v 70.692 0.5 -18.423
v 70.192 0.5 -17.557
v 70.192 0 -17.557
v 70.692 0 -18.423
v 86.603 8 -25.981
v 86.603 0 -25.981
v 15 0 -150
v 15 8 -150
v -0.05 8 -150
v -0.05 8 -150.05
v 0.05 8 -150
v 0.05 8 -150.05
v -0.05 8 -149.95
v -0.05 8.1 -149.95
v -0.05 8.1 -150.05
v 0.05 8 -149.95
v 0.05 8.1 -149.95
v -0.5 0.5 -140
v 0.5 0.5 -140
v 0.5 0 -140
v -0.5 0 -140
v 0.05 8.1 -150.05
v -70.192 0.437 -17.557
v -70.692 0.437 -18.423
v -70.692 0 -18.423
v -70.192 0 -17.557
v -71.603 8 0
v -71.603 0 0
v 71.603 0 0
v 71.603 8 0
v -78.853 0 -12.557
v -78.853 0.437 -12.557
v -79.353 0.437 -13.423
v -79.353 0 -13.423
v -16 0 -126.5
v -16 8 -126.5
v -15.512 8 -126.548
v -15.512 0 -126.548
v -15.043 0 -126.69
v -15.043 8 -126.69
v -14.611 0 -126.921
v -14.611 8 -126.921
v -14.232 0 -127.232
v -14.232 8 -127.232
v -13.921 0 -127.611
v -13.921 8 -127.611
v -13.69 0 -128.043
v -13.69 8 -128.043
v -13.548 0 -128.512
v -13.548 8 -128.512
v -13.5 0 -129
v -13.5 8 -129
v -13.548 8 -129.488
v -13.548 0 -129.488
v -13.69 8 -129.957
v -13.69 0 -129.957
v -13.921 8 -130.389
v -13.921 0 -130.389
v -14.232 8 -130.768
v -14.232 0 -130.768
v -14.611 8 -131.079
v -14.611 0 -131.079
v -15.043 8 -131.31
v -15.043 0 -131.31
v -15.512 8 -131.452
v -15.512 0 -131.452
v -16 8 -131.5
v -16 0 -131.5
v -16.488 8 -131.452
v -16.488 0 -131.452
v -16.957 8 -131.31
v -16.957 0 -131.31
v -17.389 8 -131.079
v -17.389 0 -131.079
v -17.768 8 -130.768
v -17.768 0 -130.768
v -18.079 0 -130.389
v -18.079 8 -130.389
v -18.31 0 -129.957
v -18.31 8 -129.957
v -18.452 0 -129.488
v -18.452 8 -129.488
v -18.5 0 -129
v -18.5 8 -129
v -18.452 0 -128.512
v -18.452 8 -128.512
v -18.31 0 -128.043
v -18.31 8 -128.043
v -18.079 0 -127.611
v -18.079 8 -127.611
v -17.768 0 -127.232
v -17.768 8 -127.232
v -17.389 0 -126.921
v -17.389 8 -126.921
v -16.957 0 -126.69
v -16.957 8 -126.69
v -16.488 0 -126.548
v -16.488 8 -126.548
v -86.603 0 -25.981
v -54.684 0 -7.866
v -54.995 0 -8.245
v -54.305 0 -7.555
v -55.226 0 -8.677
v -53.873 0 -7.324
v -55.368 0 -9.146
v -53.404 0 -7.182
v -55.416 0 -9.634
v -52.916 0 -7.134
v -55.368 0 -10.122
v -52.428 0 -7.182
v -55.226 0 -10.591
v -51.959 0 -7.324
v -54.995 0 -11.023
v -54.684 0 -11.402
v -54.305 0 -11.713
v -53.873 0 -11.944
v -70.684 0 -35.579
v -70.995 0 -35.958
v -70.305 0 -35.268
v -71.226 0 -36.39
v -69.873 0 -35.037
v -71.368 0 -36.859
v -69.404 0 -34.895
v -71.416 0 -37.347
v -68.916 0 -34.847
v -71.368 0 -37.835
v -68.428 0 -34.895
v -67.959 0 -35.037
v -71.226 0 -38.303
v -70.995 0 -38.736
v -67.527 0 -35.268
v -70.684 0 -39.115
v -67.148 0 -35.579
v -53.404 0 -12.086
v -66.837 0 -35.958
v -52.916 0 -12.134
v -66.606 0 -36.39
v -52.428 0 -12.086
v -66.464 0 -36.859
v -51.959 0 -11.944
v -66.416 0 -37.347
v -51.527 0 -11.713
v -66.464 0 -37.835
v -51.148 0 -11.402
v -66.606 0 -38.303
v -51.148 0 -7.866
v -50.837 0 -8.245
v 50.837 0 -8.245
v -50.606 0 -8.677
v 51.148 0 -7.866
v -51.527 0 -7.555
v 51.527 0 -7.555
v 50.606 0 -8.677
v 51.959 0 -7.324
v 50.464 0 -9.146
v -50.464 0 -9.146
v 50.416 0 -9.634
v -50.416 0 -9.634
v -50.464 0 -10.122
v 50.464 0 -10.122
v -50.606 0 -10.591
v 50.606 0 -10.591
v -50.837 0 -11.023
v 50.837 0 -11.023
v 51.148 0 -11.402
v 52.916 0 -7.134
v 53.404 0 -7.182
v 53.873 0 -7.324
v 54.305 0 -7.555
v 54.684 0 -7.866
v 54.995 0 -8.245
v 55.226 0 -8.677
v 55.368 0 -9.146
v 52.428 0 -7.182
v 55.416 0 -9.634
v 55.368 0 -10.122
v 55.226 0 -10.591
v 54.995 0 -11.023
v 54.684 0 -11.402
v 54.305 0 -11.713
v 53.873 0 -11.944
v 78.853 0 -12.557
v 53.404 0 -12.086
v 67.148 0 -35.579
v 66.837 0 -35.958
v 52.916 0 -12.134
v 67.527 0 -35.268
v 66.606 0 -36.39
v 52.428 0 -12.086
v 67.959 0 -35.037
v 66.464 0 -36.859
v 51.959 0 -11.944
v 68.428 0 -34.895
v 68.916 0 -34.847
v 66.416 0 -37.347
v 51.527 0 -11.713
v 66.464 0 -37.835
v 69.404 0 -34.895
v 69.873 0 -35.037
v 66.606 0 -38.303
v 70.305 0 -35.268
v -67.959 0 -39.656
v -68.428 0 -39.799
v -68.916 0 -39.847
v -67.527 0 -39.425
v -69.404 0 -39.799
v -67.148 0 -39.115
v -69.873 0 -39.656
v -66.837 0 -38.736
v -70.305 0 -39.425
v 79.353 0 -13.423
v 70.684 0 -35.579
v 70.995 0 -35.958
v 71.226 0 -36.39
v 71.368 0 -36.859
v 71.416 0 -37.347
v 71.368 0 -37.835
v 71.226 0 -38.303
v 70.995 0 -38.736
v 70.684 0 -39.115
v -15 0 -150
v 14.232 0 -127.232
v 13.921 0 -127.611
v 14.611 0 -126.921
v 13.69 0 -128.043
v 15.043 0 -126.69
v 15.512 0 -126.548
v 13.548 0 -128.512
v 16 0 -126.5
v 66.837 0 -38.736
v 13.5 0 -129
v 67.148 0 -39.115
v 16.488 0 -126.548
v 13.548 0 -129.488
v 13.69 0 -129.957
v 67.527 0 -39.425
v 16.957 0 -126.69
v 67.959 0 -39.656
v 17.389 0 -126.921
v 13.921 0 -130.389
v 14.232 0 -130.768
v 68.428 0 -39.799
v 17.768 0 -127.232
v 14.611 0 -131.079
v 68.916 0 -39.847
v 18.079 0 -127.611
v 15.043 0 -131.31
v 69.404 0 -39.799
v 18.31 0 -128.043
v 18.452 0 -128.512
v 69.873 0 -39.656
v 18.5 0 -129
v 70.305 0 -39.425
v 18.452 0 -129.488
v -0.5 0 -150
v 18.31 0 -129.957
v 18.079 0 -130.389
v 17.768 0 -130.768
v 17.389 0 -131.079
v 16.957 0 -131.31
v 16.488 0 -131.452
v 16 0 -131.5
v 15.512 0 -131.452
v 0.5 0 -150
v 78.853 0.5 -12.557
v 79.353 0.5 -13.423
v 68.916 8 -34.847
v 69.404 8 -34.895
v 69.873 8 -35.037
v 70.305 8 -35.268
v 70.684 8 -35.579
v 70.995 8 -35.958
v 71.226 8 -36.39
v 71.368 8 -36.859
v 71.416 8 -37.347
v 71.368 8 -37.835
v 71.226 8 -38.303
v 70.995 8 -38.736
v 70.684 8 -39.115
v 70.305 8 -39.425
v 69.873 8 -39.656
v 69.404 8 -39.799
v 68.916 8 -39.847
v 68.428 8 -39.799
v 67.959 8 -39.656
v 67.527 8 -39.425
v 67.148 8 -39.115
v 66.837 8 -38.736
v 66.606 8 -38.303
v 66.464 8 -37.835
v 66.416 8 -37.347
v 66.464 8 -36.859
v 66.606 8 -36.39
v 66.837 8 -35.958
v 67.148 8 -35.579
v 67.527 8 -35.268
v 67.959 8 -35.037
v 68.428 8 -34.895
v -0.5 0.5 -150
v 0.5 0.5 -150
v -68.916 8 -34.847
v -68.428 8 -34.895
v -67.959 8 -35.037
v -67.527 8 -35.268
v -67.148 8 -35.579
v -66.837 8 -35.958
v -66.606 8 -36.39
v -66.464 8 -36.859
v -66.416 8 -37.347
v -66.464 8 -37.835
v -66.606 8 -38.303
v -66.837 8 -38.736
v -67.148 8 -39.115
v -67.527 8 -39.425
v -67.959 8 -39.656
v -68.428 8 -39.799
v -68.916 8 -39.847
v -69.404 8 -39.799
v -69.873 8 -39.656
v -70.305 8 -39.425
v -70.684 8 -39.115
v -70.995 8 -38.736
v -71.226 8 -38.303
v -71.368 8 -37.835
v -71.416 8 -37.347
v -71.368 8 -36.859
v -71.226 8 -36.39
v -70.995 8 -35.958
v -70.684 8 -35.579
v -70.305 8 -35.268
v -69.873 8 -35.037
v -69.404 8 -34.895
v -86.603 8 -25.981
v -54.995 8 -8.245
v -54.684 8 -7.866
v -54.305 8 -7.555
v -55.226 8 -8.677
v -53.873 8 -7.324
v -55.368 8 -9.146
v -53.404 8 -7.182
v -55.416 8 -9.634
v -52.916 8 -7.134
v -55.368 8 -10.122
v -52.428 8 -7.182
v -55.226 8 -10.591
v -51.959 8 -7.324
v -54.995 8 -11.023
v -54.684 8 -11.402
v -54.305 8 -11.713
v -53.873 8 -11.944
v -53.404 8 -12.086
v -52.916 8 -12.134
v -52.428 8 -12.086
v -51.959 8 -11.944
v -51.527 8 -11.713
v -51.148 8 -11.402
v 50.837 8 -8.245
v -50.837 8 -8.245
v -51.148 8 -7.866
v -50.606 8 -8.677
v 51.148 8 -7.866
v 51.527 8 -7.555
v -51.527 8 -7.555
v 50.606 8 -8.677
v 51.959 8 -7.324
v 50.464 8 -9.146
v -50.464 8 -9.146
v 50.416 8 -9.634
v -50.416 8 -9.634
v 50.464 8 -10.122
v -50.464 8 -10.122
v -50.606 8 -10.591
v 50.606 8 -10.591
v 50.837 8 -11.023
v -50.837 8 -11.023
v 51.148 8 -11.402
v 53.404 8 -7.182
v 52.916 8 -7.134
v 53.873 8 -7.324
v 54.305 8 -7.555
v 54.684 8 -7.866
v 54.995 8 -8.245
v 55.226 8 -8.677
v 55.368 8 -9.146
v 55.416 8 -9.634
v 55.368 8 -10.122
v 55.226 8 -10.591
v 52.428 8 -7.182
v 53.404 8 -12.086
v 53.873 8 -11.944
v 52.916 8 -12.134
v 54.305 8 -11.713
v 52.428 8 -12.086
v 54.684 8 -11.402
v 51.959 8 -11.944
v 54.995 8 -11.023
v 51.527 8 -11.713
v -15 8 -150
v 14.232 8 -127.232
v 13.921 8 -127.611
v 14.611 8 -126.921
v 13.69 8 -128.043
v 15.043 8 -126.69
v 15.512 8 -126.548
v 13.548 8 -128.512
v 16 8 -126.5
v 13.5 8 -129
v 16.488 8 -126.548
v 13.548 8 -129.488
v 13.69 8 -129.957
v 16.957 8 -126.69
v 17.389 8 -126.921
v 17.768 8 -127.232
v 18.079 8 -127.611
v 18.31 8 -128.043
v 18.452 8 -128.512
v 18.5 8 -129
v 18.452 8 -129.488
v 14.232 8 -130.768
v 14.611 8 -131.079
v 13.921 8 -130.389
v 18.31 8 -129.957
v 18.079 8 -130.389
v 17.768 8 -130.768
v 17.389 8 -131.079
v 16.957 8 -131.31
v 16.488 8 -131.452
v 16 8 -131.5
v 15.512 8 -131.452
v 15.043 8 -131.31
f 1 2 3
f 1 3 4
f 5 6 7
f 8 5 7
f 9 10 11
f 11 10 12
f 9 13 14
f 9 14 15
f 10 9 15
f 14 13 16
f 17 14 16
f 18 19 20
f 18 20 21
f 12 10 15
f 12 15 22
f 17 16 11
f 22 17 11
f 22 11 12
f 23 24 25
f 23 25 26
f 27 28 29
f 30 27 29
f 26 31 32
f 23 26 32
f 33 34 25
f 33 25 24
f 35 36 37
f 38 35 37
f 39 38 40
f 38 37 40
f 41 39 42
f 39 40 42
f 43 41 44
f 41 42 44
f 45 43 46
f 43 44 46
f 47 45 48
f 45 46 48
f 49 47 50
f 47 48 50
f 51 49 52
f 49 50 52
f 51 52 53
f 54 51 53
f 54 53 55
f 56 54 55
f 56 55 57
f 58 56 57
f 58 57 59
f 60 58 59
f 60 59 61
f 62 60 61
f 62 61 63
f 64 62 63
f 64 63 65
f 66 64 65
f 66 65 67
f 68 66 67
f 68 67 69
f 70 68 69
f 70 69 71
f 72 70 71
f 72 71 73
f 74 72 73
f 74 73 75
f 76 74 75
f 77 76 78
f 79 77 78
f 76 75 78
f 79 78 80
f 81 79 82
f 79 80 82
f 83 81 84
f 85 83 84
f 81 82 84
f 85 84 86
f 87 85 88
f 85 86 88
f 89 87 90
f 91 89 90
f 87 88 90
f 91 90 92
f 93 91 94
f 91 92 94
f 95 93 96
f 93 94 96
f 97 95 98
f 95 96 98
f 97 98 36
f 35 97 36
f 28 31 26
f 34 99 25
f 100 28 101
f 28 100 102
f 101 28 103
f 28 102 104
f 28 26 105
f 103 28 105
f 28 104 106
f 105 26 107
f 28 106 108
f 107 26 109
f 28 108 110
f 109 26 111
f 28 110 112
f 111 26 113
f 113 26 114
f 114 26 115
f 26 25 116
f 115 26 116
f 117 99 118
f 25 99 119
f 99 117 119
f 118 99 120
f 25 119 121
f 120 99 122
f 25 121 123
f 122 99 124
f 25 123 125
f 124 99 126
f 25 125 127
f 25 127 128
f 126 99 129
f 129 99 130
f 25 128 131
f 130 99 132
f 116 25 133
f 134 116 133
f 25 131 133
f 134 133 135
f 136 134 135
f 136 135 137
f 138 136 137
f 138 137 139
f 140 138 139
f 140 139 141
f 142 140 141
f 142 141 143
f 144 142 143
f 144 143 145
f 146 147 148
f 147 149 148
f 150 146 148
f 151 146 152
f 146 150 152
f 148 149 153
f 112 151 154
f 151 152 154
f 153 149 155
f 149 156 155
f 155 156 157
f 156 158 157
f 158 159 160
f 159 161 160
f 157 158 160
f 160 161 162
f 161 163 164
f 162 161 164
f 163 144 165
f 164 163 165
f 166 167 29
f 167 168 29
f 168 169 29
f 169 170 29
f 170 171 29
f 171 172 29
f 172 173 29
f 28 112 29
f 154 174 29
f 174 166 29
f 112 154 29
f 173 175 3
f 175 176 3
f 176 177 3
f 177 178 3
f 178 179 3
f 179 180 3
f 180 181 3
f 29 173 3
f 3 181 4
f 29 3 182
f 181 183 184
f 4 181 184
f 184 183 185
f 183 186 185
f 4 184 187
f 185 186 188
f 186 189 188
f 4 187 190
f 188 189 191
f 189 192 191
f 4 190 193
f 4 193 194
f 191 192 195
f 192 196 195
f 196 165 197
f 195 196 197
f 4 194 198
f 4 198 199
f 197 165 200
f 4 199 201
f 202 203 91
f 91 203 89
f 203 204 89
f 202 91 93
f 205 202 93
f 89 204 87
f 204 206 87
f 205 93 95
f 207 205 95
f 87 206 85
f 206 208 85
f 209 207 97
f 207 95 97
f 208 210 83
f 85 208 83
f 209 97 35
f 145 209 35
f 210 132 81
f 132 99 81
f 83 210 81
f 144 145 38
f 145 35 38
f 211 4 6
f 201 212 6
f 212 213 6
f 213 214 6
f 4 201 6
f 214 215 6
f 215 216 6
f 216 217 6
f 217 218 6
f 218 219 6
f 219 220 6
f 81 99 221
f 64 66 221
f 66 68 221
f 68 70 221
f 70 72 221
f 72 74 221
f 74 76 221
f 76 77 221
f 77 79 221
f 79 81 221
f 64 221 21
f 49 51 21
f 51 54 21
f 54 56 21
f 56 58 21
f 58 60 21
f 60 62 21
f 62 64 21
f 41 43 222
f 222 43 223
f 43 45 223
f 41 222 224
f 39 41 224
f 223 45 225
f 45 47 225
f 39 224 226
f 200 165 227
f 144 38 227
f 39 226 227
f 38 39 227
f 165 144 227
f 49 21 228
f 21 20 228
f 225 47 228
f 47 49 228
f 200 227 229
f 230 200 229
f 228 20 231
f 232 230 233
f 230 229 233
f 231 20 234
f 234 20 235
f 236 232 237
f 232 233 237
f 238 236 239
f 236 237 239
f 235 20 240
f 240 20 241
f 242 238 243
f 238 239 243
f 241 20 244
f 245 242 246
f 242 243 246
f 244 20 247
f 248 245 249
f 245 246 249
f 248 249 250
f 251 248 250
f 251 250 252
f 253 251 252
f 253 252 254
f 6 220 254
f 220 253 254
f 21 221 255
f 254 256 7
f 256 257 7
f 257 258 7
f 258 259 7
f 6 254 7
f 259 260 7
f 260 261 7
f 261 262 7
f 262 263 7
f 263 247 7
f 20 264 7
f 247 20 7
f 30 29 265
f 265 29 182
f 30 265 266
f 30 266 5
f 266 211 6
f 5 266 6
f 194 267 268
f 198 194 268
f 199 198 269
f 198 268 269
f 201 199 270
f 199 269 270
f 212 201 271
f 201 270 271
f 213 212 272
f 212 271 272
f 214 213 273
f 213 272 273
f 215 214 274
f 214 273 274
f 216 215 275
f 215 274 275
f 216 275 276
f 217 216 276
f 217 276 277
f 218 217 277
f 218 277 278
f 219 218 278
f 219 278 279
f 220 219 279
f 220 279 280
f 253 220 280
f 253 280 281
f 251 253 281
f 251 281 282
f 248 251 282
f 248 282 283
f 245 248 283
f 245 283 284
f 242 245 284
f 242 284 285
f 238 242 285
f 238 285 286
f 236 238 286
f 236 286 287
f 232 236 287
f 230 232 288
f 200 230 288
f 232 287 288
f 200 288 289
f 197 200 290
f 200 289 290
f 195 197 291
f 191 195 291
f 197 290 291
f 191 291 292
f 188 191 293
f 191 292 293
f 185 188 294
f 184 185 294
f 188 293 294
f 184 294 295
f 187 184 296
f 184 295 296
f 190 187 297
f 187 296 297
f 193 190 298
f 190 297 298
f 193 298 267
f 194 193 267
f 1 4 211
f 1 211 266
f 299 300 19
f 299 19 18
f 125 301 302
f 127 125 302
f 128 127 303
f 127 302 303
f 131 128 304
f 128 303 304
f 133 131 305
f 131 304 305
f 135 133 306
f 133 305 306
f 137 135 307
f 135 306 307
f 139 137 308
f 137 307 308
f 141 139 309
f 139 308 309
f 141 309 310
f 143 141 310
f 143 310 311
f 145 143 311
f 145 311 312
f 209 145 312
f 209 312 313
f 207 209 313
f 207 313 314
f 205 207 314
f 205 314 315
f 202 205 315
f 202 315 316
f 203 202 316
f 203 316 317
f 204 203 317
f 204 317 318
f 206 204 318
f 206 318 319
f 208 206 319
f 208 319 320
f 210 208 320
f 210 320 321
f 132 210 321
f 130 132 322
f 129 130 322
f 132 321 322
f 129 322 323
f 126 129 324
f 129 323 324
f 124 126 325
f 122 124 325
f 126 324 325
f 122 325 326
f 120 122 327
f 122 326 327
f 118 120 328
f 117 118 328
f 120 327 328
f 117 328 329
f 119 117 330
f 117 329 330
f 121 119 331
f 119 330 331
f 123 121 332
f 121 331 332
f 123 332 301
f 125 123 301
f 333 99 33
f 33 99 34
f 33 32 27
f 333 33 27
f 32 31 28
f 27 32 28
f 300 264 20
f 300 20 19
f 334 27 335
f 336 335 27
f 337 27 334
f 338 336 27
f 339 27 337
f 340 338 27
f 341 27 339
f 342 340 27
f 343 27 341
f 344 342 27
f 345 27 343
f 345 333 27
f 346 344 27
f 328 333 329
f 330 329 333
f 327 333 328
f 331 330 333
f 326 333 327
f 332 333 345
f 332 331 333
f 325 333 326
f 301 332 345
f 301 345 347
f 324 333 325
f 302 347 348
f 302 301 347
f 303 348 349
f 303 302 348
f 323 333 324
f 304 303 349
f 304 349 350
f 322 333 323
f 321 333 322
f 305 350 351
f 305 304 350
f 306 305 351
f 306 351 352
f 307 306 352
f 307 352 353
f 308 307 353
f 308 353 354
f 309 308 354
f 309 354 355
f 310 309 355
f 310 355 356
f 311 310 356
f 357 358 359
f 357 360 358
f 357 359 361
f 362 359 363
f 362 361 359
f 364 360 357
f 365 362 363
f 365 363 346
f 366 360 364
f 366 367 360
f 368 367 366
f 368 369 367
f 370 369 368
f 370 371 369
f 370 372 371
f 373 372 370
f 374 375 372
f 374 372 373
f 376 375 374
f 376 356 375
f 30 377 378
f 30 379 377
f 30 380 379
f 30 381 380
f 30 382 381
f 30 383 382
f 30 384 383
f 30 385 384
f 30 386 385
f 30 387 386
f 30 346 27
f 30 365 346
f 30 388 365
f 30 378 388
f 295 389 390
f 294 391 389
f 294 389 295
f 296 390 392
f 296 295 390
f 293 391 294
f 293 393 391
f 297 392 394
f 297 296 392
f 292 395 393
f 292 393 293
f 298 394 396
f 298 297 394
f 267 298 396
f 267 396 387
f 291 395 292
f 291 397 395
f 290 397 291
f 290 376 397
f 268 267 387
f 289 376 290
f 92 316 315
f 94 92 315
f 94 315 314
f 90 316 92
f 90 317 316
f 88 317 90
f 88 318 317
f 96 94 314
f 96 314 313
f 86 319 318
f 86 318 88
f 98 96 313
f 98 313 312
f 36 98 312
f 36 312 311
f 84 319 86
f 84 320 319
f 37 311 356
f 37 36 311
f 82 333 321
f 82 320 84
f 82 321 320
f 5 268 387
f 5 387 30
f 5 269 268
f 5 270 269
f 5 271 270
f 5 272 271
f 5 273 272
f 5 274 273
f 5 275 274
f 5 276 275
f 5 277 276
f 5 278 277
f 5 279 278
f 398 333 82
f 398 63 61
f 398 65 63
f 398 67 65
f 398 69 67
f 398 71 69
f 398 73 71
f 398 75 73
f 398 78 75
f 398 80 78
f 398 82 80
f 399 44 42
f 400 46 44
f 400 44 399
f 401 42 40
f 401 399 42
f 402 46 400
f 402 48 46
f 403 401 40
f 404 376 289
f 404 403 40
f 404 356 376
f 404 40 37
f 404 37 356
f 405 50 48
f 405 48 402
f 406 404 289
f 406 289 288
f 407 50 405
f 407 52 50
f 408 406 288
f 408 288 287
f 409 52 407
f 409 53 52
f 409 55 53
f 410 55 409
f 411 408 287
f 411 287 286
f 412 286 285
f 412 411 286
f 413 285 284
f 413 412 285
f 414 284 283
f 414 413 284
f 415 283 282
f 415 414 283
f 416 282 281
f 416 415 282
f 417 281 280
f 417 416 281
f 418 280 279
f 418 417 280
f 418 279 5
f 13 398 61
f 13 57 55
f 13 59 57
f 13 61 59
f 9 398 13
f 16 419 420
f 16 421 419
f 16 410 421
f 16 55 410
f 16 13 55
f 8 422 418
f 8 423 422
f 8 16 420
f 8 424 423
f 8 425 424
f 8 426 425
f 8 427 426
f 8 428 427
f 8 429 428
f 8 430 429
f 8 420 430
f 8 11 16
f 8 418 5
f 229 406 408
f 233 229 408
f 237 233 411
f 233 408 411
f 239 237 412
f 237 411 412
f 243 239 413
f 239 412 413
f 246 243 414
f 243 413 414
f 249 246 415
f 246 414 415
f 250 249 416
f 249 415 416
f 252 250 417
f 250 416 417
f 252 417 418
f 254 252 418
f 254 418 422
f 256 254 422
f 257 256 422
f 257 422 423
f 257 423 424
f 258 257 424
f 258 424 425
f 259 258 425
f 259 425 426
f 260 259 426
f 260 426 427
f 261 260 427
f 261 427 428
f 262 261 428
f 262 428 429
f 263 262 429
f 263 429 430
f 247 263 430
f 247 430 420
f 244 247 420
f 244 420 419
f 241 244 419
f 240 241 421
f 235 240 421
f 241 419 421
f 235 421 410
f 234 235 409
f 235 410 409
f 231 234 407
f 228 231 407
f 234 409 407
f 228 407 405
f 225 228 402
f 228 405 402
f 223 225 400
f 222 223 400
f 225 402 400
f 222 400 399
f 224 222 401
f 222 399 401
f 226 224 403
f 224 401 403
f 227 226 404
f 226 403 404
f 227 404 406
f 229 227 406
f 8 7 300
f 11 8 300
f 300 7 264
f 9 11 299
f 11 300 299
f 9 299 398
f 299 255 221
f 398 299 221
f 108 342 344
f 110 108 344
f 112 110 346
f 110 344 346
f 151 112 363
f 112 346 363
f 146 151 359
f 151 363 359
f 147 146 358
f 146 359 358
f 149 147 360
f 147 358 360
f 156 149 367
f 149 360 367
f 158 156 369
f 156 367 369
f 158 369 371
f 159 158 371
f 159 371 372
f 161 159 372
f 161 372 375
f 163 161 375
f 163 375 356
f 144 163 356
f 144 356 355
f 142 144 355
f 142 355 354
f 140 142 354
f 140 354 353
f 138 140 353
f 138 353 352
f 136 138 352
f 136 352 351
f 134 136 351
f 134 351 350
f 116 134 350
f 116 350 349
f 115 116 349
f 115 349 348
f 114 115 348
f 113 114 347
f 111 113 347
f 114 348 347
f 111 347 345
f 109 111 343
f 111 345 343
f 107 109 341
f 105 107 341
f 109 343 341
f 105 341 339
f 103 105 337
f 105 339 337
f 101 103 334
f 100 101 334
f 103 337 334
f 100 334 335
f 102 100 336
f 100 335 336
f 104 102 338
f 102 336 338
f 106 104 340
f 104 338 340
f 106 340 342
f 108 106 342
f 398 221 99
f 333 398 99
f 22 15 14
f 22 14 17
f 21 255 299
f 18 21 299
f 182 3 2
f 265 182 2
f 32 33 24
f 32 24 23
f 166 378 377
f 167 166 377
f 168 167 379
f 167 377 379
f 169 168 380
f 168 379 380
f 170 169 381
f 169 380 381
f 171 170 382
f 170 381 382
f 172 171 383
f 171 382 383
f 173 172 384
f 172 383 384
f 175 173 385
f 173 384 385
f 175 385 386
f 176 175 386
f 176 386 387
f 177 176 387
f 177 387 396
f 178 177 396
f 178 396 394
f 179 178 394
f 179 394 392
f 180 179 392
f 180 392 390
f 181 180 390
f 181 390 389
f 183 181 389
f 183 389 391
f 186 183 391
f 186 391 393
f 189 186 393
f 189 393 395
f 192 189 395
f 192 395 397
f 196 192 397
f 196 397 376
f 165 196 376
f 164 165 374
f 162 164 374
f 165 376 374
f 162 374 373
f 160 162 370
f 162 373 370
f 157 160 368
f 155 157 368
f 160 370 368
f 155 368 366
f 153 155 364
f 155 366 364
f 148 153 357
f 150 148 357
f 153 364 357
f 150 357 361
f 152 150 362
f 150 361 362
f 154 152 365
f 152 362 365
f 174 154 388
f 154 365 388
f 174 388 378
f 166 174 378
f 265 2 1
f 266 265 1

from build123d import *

# Parameters (mm, degrees)
SALIENTE_EXTRUIR2_DEPTH = 8
CROQUIS3_R              = 2.5
CORTAR_EXTRUIR1_DEPTH   = 31
CROQUIS4_W              = 0.1
CROQUIS4_H              = 0.1
SALIENTE_EXTRUIR3_DEPTH = 0.1
CROQUIS5_W              = 1
CROQUIS5_H              = 0.8740111
CORTAR_EXTRUIR2_DEPTH   = 10
CROQUIS6_W              = 1
CROQUIS6_H              = 1
CORTAR_EXTRUIR3_DEPTH   = 10
CROQUIS8_W              = 1
CROQUIS8_H              = 1
CORTAR_EXTRUIR4_DEPTH   = 10


with BuildPart() as part:
    # Croquis1 → Saliente-Extruir2 (new body)
    with BuildSketch(Plane(origin=(0, 0, 0), x_dir=(1, 0, 0), z_dir=(0, 1, 0))):
        Polygon((71.602540378, 0), (86.602540378, 25.980762114), (15, 150), (-15, 150), (-86.602540378, 25.980762114), (-71.602540378, 0), align=None)
    extrude(amount=SALIENTE_EXTRUIR2_DEPTH)

    # Croquis3 → Cortar-Extruir1 (cut)
    with BuildSketch(Plane(origin=(0, 8, 0), x_dir=(1, 0, 0), z_dir=(0, 1, 0))):
        with Locations(Location((-16, 129, 0), (0, 0, 270))):
            Circle(CROQUIS3_R)
        with Locations(Location((16, 129, 0), (0, 0, 270))):
            Circle(CROQUIS3_R)
        with Locations(Location((-52.916006899, 9.633974596, 0), (0, 0, 270))):
            Circle(CROQUIS3_R)
        with Locations(Location((-68.916006899, 37.346787517, 0), (0, 0, 270))):
            Circle(CROQUIS3_R)
        with Locations(Location((52.916006899, 9.633974596, 0), (0, 0, 270))):
            Circle(CROQUIS3_R)
        with Locations(Location((68.916006899, 37.346787517, 0), (0, 0, 270))):
            Circle(CROQUIS3_R)
    extrude(amount=-CORTAR_EXTRUIR1_DEPTH, mode=Mode.SUBTRACT)

    # Croquis4 → Saliente-Extruir3 (add)
    with BuildSketch(Plane(origin=(0, 8, 0), x_dir=(1, 0, 0), z_dir=(0, 1, 0))):
        with Locations((0, 150)):
            Rectangle(CROQUIS4_W, CROQUIS4_H)
    extrude(amount=SALIENTE_EXTRUIR3_DEPTH)

    # Croquis5 → Cortar-Extruir2 (cut)
    with BuildSketch(Plane(origin=(-53.701905284, 0, 31.004809472), x_dir=(0.5000000000000006, 0, 0.8660254037844384), z_dir=(-0.8660254037844384, 0, 0.5000000000000006))):
        with Locations((-50.801270189, 0)):
            Rectangle(CROQUIS5_W, CROQUIS5_H)
    extrude(amount=-CORTAR_EXTRUIR2_DEPTH, mode=Mode.SUBTRACT)

    # Croquis6 → Cortar-Extruir3 (cut)
    with BuildSketch(Plane(origin=(53.701905284, 0, 31.004809472), x_dir=(0.4999999999999996, 0, -0.8660254037844389), z_dir=(0.8660254037844389, 0, 0.4999999999999996))):
        with Locations((50.801270189, 0)):
            Rectangle(CROQUIS6_W, CROQUIS6_H)
    extrude(amount=-CORTAR_EXTRUIR3_DEPTH, mode=Mode.SUBTRACT)

    # Croquis8 → Cortar-Extruir4 (cut)
    with BuildSketch(Plane(origin=(0, 0, -150), x_dir=(-1, 0, 0), z_dir=(0, 0, -1))):
        Rectangle(CROQUIS8_W, CROQUIS8_H)
    extrude(amount=-CORTAR_EXTRUIR4_DEPTH, mode=Mode.SUBTRACT)


solid = part.part
